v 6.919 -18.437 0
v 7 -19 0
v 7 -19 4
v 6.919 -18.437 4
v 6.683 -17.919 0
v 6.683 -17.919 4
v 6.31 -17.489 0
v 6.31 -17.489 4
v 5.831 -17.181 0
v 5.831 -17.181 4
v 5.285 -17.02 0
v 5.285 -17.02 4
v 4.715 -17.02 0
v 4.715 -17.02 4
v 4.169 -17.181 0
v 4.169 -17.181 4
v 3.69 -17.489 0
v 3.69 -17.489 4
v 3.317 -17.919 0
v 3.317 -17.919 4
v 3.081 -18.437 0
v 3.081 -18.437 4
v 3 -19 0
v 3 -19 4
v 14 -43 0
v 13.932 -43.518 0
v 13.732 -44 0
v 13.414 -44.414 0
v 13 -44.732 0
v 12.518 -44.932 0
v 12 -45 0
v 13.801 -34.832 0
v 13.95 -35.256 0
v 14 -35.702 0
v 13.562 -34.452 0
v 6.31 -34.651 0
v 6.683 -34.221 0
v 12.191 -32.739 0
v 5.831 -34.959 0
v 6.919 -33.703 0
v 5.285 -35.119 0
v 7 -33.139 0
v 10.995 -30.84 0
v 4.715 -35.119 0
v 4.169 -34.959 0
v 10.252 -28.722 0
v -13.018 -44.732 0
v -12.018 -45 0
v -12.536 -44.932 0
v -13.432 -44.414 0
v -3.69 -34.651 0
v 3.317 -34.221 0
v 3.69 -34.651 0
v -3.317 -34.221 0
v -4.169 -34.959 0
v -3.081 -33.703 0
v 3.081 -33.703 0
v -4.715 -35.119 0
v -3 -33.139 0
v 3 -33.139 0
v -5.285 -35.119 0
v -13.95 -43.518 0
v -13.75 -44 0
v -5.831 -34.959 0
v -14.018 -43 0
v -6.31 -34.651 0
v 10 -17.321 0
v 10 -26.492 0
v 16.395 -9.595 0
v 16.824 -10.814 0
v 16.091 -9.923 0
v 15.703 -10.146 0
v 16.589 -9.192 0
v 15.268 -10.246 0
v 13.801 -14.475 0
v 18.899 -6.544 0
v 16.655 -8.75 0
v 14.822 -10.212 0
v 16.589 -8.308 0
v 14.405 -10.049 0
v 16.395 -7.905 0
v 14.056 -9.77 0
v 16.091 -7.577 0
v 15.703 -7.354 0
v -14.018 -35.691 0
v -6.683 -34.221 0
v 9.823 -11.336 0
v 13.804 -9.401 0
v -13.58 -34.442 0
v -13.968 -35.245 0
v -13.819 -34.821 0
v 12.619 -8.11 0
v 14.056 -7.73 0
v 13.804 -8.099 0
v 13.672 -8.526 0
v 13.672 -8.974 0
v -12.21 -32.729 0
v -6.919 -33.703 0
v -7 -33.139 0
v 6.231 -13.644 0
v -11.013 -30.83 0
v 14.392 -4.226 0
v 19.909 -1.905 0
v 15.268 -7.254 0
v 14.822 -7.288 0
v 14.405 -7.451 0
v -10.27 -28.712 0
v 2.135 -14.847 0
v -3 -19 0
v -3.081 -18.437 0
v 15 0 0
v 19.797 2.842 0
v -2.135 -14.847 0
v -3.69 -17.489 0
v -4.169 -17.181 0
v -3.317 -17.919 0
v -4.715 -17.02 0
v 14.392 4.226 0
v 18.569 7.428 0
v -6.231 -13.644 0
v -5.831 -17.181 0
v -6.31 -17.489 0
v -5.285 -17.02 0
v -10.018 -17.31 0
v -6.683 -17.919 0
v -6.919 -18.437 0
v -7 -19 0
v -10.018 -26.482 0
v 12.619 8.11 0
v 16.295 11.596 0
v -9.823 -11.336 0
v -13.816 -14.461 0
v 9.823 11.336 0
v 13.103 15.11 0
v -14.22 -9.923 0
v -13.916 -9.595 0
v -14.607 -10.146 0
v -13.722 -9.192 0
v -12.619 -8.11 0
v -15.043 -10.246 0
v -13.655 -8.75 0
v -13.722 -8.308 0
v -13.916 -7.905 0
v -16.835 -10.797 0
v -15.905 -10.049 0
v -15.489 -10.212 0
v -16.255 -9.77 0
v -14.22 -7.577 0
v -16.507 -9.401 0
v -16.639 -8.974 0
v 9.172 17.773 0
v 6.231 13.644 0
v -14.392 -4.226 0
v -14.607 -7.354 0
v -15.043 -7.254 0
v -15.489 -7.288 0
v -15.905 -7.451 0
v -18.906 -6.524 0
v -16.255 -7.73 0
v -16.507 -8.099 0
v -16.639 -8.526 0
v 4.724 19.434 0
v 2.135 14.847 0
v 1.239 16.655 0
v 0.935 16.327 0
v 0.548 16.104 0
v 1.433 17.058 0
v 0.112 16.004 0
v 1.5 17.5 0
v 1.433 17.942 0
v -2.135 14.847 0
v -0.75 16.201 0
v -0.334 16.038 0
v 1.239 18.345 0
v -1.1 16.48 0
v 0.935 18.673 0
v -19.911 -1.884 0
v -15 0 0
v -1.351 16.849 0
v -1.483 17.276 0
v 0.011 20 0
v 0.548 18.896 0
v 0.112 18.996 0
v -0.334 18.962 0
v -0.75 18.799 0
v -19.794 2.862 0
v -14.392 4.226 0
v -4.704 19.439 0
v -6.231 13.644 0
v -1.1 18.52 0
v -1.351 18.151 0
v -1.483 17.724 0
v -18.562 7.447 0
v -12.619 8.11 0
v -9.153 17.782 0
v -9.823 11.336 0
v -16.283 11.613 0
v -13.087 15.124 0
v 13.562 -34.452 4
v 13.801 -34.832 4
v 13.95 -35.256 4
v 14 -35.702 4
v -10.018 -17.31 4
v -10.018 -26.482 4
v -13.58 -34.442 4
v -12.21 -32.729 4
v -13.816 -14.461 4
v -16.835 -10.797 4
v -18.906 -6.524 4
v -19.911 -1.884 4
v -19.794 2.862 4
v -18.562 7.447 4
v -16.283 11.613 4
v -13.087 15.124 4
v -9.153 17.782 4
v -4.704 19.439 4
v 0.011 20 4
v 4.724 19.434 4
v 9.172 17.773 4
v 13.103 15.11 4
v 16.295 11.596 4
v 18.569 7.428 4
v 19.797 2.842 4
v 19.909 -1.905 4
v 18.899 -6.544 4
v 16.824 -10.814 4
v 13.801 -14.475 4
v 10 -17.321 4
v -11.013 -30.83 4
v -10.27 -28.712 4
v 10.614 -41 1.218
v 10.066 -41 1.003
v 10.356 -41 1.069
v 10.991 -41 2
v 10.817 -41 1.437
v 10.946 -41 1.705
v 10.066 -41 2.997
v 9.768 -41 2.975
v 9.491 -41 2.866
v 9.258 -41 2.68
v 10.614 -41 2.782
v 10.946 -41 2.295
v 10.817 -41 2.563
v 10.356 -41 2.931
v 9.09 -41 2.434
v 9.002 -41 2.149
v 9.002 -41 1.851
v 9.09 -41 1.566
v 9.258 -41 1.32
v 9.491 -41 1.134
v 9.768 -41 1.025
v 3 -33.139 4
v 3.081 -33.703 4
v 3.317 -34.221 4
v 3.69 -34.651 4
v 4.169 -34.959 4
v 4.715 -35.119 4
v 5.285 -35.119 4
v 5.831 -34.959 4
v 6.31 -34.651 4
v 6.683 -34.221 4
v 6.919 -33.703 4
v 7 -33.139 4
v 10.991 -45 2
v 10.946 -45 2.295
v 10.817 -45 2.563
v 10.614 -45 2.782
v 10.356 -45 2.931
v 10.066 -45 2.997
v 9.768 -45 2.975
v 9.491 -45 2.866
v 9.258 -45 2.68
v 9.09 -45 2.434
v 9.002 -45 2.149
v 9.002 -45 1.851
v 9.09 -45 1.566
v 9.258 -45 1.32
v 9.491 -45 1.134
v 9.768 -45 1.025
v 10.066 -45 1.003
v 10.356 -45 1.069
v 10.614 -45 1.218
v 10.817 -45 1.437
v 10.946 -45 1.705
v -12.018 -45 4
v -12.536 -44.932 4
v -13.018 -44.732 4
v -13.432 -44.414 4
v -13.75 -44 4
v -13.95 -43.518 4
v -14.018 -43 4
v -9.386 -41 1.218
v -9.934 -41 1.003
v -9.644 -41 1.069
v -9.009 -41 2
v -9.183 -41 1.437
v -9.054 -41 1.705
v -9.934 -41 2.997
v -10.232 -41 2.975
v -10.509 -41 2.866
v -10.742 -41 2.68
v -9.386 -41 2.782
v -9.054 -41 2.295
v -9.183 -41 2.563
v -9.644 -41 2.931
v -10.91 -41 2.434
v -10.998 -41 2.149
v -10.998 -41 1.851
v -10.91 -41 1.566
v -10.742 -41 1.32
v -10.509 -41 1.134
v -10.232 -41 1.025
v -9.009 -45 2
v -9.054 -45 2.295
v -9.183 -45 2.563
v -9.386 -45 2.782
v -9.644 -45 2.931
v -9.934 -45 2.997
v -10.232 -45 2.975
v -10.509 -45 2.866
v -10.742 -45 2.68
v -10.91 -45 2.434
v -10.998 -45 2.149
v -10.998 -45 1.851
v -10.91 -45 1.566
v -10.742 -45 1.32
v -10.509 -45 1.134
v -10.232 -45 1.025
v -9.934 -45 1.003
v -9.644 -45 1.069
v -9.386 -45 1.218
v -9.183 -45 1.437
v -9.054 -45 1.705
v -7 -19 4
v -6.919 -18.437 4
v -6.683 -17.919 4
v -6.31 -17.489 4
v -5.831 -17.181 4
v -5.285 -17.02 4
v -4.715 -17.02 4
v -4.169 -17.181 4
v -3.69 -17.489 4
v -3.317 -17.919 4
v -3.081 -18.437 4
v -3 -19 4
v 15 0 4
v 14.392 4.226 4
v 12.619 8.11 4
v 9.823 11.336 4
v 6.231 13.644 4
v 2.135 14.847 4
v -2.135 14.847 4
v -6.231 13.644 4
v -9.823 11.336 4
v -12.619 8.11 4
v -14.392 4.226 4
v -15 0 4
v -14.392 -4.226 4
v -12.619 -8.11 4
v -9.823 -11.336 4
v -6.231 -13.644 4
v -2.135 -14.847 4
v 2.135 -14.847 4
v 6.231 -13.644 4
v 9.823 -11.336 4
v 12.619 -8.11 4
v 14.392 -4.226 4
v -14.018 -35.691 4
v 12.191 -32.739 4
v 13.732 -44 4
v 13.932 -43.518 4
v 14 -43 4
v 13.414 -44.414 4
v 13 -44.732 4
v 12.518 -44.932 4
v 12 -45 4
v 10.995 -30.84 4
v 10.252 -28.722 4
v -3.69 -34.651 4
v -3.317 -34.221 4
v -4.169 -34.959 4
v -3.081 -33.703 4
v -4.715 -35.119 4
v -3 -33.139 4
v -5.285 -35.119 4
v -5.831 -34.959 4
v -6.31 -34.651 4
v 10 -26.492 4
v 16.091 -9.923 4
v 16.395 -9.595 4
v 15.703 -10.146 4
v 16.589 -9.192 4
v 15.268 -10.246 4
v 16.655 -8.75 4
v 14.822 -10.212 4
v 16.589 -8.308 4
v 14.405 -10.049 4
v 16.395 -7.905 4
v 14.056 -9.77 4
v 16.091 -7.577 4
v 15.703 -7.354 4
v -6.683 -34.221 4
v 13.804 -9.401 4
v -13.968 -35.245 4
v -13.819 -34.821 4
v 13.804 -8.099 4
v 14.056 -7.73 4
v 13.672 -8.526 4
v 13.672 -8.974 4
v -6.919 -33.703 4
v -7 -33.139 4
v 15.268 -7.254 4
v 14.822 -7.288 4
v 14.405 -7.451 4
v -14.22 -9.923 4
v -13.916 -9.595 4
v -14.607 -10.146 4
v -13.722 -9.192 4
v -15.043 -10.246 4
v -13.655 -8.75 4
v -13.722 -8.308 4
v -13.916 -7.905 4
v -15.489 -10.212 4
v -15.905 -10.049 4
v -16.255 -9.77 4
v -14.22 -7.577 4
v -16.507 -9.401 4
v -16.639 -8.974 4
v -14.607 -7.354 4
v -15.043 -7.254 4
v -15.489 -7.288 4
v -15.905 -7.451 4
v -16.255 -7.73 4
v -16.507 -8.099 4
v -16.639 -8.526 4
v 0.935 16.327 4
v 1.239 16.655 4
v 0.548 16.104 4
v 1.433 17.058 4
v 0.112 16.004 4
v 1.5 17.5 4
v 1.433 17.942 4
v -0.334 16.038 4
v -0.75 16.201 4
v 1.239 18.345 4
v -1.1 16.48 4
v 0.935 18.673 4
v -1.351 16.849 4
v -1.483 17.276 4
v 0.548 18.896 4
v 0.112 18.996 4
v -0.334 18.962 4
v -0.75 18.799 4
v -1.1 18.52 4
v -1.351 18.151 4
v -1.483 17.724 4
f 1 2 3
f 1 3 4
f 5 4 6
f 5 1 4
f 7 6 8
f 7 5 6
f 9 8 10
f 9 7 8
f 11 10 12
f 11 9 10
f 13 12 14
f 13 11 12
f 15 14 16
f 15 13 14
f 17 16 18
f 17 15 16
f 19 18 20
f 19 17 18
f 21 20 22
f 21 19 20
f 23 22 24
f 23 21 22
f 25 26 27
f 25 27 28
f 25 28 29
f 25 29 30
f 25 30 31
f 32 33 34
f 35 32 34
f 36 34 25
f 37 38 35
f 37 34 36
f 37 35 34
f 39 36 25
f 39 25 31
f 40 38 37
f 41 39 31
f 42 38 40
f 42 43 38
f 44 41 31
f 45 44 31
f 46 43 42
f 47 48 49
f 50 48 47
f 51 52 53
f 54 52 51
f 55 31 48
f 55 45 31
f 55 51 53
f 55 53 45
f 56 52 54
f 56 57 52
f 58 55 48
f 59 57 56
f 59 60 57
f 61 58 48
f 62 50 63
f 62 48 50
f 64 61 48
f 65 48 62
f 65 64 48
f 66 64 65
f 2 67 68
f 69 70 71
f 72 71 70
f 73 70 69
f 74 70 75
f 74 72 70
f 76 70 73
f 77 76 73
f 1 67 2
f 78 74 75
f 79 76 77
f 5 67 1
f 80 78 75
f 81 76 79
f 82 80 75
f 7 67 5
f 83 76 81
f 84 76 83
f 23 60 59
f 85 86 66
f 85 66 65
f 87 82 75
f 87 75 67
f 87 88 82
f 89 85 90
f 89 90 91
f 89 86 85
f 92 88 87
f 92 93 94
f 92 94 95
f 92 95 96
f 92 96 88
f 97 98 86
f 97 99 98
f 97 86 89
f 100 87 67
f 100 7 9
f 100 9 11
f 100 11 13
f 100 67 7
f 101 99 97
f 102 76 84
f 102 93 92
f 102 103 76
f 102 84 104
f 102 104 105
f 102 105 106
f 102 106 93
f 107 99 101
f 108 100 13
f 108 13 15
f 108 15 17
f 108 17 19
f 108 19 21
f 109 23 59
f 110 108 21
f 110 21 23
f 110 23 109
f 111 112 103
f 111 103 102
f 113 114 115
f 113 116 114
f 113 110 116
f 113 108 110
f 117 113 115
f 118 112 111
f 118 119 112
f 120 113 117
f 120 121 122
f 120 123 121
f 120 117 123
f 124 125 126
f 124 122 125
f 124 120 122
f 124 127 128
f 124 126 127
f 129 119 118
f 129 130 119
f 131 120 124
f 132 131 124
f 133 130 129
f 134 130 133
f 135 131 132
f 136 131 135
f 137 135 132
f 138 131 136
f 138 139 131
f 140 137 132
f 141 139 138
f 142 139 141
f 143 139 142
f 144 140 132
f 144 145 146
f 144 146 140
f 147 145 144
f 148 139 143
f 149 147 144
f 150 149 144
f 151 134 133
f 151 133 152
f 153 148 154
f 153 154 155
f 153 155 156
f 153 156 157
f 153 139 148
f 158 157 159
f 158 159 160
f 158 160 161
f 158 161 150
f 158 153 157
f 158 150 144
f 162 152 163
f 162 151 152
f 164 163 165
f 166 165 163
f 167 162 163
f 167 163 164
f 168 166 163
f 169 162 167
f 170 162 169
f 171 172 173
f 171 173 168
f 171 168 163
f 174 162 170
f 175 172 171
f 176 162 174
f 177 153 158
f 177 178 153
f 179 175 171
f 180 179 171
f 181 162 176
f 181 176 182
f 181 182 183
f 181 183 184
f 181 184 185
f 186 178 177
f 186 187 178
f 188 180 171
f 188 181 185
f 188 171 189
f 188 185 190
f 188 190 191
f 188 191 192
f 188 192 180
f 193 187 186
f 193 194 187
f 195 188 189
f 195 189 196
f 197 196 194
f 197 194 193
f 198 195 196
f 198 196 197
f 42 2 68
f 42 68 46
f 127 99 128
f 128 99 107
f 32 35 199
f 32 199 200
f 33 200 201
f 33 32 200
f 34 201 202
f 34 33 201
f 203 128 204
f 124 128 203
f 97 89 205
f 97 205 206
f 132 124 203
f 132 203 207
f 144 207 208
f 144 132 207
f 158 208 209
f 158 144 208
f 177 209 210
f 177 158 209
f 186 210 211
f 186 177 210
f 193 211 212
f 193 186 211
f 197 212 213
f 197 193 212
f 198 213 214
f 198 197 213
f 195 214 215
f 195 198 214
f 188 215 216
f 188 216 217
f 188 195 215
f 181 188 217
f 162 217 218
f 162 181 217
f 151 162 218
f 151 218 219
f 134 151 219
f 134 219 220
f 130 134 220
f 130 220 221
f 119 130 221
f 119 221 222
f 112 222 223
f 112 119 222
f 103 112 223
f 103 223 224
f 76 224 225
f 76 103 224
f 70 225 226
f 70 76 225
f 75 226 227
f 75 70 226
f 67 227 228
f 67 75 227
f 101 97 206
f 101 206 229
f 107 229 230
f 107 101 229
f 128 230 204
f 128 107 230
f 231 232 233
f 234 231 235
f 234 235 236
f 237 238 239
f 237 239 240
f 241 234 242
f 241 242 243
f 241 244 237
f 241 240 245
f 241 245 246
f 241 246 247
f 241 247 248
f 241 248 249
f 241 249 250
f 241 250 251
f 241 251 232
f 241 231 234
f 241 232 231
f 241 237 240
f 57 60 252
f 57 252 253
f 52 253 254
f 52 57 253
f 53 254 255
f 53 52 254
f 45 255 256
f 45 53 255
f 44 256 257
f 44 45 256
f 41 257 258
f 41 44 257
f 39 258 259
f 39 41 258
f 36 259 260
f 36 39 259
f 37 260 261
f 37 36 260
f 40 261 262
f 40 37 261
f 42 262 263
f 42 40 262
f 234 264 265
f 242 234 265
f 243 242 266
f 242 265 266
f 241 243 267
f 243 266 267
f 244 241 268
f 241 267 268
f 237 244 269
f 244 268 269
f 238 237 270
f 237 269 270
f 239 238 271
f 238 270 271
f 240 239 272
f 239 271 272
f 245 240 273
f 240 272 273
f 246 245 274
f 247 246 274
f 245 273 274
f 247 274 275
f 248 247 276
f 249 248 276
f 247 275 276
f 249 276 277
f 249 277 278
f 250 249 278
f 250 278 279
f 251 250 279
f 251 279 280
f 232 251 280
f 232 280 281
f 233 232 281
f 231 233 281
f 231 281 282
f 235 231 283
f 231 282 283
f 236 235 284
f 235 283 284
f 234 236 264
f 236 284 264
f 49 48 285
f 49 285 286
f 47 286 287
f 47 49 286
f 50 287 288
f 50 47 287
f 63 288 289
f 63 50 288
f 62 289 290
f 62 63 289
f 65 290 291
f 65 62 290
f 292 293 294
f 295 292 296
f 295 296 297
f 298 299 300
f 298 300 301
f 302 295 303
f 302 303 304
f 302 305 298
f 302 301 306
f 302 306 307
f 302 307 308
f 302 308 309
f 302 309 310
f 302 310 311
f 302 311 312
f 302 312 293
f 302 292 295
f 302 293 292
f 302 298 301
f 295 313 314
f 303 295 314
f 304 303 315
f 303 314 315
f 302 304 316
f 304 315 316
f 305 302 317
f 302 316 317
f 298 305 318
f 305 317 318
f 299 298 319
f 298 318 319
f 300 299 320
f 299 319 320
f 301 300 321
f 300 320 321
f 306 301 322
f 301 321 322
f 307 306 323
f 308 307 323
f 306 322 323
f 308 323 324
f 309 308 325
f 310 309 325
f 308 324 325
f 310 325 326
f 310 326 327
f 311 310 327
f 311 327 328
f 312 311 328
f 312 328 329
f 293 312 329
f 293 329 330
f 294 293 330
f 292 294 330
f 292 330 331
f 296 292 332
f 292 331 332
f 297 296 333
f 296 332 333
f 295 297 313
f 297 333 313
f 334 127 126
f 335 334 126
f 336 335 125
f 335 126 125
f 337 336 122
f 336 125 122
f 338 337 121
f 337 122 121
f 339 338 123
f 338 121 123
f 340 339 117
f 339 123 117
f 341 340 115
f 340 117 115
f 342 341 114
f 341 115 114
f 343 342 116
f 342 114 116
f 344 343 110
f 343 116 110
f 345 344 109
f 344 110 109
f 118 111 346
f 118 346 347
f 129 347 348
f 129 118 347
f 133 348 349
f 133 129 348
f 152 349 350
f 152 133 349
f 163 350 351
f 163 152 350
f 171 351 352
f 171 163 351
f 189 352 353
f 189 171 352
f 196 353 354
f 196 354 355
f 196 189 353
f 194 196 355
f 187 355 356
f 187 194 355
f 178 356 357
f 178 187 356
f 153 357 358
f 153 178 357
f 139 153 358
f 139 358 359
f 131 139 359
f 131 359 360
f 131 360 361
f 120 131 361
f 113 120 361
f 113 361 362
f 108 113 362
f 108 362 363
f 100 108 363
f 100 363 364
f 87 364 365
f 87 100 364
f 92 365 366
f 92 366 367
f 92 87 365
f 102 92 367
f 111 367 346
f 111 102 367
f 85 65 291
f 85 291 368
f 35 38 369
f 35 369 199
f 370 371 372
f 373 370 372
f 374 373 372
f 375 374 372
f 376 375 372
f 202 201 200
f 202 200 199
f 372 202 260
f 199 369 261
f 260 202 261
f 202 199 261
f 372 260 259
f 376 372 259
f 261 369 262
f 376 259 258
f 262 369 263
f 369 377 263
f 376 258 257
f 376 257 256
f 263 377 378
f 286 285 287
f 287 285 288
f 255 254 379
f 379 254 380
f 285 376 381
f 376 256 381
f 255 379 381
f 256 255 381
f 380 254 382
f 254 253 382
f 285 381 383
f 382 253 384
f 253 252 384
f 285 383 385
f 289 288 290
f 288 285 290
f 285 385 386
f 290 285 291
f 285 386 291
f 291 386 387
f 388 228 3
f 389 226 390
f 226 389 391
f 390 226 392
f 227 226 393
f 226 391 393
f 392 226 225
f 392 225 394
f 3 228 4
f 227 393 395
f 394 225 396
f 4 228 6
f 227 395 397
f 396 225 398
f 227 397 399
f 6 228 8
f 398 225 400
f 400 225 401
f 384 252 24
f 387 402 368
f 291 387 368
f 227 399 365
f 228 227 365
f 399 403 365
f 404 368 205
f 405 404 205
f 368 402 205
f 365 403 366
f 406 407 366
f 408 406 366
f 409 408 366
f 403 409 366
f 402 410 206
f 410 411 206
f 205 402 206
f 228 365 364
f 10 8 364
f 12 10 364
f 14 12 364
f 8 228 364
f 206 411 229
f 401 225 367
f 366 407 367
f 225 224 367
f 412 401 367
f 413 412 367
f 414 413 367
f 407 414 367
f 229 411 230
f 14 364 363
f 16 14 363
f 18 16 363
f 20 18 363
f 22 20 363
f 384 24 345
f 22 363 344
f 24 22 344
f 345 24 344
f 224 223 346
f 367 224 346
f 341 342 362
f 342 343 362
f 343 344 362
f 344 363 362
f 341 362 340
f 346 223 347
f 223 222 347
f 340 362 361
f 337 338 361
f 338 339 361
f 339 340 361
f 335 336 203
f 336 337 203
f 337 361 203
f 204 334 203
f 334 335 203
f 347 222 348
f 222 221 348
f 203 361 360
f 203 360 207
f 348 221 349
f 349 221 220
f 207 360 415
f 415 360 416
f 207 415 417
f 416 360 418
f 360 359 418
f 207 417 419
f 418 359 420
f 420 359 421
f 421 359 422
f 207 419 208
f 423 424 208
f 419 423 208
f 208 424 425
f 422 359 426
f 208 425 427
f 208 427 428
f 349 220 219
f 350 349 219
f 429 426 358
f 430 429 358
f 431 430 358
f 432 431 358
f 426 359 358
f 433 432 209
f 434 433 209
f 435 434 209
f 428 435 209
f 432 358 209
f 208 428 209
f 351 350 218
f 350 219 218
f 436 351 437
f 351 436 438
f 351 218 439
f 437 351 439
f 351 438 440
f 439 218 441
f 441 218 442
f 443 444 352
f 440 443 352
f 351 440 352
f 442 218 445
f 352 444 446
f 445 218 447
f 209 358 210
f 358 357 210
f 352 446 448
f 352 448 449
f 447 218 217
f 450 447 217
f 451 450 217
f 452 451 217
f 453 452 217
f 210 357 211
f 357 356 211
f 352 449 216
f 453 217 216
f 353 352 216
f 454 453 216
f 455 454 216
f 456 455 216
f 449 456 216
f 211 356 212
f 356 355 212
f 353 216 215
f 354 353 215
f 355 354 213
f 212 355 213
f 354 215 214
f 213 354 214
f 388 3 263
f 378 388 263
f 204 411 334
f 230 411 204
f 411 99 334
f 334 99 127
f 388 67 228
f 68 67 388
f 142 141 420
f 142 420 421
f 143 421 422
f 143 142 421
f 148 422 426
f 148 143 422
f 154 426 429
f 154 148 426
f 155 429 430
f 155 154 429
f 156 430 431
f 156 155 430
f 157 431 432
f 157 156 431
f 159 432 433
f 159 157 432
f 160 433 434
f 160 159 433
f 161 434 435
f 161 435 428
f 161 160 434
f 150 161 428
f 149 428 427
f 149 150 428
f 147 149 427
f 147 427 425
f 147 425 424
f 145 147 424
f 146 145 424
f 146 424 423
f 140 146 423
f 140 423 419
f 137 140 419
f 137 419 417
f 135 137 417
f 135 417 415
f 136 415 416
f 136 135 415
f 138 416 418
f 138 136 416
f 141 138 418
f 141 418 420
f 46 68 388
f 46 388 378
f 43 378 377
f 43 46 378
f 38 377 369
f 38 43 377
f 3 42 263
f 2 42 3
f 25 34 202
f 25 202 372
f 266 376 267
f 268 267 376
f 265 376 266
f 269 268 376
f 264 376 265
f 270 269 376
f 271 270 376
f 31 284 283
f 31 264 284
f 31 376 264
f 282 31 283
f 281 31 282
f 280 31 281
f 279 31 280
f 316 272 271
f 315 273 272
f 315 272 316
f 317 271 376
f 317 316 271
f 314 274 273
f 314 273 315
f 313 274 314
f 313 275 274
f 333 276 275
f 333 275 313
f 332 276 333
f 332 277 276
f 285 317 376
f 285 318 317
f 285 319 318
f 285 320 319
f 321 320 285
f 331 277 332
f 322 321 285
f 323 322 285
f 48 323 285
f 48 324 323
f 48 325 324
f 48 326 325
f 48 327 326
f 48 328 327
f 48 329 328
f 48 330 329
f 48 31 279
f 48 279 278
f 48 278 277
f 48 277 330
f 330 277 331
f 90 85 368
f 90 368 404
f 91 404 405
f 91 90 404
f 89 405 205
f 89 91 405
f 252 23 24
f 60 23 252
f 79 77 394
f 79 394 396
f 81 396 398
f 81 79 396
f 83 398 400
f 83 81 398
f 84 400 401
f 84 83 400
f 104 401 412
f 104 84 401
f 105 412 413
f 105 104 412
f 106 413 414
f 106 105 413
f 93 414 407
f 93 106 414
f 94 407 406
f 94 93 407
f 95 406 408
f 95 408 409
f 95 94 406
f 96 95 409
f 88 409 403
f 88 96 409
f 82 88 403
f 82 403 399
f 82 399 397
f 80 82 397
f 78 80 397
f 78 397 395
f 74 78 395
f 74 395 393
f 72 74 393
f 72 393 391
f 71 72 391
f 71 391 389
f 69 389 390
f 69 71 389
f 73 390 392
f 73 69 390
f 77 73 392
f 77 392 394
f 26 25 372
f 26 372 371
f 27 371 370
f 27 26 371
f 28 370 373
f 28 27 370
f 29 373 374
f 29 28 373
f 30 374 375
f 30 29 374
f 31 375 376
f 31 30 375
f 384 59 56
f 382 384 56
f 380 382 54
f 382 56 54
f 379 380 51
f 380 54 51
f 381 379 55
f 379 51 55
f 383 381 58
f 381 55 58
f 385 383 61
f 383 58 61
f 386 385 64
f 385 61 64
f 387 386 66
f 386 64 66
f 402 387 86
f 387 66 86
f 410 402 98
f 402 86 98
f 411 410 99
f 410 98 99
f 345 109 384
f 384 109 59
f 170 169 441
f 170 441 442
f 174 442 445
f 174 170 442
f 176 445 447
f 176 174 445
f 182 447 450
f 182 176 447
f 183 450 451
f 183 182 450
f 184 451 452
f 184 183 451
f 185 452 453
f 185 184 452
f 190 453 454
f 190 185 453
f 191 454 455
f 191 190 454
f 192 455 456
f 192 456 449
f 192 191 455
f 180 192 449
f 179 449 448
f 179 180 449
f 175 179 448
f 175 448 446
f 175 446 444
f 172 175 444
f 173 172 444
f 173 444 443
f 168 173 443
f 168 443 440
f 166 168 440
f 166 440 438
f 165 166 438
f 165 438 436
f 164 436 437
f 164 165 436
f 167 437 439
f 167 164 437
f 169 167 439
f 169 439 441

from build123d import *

# Parameters (mm, degrees)
SKETCH1_R           = 15
SKETCH1_R_2         = 1.5
BOSS_EXTRUDE1_DEPTH = 4
SKETCH2_R           = 1
CUT_EXTRUDE1_DEPTH  = 4


with BuildPart() as part:
    # Sketch1 → Boss-Extrude1 (new body)
    with BuildSketch(Plane.XY):
        with BuildLine():
            Line((12.191311906, -32.739139882), (13.561737619, -34.452172024))
            ThreePointArc((13.561737619, -34.452172024), (13.887256638, -35.039548236), (14, -35.701562119))
            Line((14, -35.701562119), (14, -43))
            ThreePointArc((14, -43), (13.414213562, -44.414213562), (12, -45))
            Line((12, -45), (-12.018212743, -45))
            ThreePointArc((-12.018212743, -45), (-13.432426305, -44.414213562), (-14.018212743, -43))
            Line((-14.018212743, -43), (-14.018212743, -35.691034212))
            ThreePointArc((-14.018212743, -35.691034212), (-13.905469381, -35.029020329), (-13.579950362, -34.441644117))
            Line((-13.579950362, -34.441644117), (-12.209524648, -32.728611975))
            ThreePointArc((-12.209524648, -32.728611975), (-10.581929551, -29.791730914), (-10.018212743, -26.481661499))
            Line((-10.018212743, -26.481661499), (-10.018212743, -17.309980169))
            ThreePointArc((-10.018212743, -17.309980169), (0.010518327, 19.999997234), (10, -17.320508076))
            Line((10, -17.320508076), (10, -26.492189406))
            ThreePointArc((10, -26.492189406), (10.563716808, -29.802258821), (12.191311906, -32.739139882))
        make_face()
        Circle(SKETCH1_R, mode=Mode.SUBTRACT)
        with Locations((0, 17.5)):
            Circle(SKETCH1_R_2, mode=Mode.SUBTRACT)
        with Locations((15.155444566, -8.75)):
            Circle(SKETCH1_R_2, mode=Mode.SUBTRACT)
        with Locations((-15.155444566, -8.75)):
            Circle(SKETCH1_R_2, mode=Mode.SUBTRACT)
        with BuildLine():
            Line((-3, -19), (-3, -33.13932584))
            ThreePointArc((-3, -33.13932584), (-5, -35.13932584), (-7, -33.13932584))
            Line((-7, -33.13932584), (-7, -19))
            ThreePointArc((-7, -19), (-5, -17), (-3, -19))
        make_face(mode=Mode.SUBTRACT)
        with BuildLine():
            Line((3, -19), (3, -33.13932584))
            ThreePointArc((3, -33.13932584), (5, -35.13932584), (7, -33.13932584))
            Line((7, -33.13932584), (7, -19))
            ThreePointArc((7, -19), (5, -17), (3, -19))
        make_face(mode=Mode.SUBTRACT)
    extrude(amount=BOSS_EXTRUDE1_DEPTH)

    # Sketch2 → Cut-Extrude1 (cut)
    with BuildSketch(Plane.XZ.offset(45)):
        with Locations((-10.009106371, 2)):
            Circle(SKETCH2_R)
        with Locations((9.990893629, 2)):
            Circle(SKETCH2_R)
    extrude(amount=-CUT_EXTRUDE1_DEPTH, mode=Mode.SUBTRACT)


solid = part.part
